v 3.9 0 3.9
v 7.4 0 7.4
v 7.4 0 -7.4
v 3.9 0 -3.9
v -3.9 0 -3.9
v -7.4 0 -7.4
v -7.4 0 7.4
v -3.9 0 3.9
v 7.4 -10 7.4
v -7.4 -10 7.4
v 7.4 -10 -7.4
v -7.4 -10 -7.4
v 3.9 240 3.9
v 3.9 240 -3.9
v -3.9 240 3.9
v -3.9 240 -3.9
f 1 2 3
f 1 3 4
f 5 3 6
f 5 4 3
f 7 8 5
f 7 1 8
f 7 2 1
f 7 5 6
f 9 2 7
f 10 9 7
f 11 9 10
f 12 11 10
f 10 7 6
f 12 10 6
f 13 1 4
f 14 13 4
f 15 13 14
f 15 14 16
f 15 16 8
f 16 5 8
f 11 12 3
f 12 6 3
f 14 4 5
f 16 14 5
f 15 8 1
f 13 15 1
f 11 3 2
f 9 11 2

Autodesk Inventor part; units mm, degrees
ref_plane "YZ Plane" through (0, 0, 0) normal (1, 0, 0) x (0, 1, 0)
ref_plane "XZ Plane" through (0, 0, 0) normal (0, 1, 0) x (-1, 0, 0)
ref_plane "XY Plane" through (0, 0, 0) normal (0, 0, 1) x (1, 0, 0)
sketch "Szkic1" plane through (0, 0, 0) normal (0, 1, 0) x (-1, 0, 0)
  line L0 (-7.4, 7.4) -> (7.4, 7.4)
  line L1 (7.4, 7.4) -> (7.4, -7.4)
  line L2 (7.4, -7.4) -> (-7.4, -7.4)
  line L3 (-7.4, -7.4) -> (-7.4, 7.4)
  line L4 (-7.4, 7.4) -> (7.4, -7.4) construction
  line L5 (7.4, 7.4) -> (-7.4, -7.4) construction
  line L6 (3.9, 3.9) -> (-3.9, 3.9)
  line L7 (-3.9, 3.9) -> (-3.9, -3.9)
  line L8 (-3.9, -3.9) -> (3.9, -3.9)
  line L9 (3.9, -3.9) -> (3.9, 3.9)
  line L10 (3.9, 3.9) -> (-3.9, -3.9) construction
  line L11 (-3.9, 3.9) -> (3.9, -3.9) construction
  point P0 (0, 0)
  dimension "d0" = 14.8
  dimension "d1" = 14.8
  dimension "d7" = 7.8
  dimension "d8" = 7.8
extrude "Wyciągnięcie proste1" add sketch "Szkic1" against normal blind 10 contours L0 L1 L2 L3 | L9 L8 L7 L6
extrude "Wyciągnięcie proste2" add sketch "Szkic1" along normal blind 240 contours L9 L8 L7 L6
properties part number "podstawa_rod"
